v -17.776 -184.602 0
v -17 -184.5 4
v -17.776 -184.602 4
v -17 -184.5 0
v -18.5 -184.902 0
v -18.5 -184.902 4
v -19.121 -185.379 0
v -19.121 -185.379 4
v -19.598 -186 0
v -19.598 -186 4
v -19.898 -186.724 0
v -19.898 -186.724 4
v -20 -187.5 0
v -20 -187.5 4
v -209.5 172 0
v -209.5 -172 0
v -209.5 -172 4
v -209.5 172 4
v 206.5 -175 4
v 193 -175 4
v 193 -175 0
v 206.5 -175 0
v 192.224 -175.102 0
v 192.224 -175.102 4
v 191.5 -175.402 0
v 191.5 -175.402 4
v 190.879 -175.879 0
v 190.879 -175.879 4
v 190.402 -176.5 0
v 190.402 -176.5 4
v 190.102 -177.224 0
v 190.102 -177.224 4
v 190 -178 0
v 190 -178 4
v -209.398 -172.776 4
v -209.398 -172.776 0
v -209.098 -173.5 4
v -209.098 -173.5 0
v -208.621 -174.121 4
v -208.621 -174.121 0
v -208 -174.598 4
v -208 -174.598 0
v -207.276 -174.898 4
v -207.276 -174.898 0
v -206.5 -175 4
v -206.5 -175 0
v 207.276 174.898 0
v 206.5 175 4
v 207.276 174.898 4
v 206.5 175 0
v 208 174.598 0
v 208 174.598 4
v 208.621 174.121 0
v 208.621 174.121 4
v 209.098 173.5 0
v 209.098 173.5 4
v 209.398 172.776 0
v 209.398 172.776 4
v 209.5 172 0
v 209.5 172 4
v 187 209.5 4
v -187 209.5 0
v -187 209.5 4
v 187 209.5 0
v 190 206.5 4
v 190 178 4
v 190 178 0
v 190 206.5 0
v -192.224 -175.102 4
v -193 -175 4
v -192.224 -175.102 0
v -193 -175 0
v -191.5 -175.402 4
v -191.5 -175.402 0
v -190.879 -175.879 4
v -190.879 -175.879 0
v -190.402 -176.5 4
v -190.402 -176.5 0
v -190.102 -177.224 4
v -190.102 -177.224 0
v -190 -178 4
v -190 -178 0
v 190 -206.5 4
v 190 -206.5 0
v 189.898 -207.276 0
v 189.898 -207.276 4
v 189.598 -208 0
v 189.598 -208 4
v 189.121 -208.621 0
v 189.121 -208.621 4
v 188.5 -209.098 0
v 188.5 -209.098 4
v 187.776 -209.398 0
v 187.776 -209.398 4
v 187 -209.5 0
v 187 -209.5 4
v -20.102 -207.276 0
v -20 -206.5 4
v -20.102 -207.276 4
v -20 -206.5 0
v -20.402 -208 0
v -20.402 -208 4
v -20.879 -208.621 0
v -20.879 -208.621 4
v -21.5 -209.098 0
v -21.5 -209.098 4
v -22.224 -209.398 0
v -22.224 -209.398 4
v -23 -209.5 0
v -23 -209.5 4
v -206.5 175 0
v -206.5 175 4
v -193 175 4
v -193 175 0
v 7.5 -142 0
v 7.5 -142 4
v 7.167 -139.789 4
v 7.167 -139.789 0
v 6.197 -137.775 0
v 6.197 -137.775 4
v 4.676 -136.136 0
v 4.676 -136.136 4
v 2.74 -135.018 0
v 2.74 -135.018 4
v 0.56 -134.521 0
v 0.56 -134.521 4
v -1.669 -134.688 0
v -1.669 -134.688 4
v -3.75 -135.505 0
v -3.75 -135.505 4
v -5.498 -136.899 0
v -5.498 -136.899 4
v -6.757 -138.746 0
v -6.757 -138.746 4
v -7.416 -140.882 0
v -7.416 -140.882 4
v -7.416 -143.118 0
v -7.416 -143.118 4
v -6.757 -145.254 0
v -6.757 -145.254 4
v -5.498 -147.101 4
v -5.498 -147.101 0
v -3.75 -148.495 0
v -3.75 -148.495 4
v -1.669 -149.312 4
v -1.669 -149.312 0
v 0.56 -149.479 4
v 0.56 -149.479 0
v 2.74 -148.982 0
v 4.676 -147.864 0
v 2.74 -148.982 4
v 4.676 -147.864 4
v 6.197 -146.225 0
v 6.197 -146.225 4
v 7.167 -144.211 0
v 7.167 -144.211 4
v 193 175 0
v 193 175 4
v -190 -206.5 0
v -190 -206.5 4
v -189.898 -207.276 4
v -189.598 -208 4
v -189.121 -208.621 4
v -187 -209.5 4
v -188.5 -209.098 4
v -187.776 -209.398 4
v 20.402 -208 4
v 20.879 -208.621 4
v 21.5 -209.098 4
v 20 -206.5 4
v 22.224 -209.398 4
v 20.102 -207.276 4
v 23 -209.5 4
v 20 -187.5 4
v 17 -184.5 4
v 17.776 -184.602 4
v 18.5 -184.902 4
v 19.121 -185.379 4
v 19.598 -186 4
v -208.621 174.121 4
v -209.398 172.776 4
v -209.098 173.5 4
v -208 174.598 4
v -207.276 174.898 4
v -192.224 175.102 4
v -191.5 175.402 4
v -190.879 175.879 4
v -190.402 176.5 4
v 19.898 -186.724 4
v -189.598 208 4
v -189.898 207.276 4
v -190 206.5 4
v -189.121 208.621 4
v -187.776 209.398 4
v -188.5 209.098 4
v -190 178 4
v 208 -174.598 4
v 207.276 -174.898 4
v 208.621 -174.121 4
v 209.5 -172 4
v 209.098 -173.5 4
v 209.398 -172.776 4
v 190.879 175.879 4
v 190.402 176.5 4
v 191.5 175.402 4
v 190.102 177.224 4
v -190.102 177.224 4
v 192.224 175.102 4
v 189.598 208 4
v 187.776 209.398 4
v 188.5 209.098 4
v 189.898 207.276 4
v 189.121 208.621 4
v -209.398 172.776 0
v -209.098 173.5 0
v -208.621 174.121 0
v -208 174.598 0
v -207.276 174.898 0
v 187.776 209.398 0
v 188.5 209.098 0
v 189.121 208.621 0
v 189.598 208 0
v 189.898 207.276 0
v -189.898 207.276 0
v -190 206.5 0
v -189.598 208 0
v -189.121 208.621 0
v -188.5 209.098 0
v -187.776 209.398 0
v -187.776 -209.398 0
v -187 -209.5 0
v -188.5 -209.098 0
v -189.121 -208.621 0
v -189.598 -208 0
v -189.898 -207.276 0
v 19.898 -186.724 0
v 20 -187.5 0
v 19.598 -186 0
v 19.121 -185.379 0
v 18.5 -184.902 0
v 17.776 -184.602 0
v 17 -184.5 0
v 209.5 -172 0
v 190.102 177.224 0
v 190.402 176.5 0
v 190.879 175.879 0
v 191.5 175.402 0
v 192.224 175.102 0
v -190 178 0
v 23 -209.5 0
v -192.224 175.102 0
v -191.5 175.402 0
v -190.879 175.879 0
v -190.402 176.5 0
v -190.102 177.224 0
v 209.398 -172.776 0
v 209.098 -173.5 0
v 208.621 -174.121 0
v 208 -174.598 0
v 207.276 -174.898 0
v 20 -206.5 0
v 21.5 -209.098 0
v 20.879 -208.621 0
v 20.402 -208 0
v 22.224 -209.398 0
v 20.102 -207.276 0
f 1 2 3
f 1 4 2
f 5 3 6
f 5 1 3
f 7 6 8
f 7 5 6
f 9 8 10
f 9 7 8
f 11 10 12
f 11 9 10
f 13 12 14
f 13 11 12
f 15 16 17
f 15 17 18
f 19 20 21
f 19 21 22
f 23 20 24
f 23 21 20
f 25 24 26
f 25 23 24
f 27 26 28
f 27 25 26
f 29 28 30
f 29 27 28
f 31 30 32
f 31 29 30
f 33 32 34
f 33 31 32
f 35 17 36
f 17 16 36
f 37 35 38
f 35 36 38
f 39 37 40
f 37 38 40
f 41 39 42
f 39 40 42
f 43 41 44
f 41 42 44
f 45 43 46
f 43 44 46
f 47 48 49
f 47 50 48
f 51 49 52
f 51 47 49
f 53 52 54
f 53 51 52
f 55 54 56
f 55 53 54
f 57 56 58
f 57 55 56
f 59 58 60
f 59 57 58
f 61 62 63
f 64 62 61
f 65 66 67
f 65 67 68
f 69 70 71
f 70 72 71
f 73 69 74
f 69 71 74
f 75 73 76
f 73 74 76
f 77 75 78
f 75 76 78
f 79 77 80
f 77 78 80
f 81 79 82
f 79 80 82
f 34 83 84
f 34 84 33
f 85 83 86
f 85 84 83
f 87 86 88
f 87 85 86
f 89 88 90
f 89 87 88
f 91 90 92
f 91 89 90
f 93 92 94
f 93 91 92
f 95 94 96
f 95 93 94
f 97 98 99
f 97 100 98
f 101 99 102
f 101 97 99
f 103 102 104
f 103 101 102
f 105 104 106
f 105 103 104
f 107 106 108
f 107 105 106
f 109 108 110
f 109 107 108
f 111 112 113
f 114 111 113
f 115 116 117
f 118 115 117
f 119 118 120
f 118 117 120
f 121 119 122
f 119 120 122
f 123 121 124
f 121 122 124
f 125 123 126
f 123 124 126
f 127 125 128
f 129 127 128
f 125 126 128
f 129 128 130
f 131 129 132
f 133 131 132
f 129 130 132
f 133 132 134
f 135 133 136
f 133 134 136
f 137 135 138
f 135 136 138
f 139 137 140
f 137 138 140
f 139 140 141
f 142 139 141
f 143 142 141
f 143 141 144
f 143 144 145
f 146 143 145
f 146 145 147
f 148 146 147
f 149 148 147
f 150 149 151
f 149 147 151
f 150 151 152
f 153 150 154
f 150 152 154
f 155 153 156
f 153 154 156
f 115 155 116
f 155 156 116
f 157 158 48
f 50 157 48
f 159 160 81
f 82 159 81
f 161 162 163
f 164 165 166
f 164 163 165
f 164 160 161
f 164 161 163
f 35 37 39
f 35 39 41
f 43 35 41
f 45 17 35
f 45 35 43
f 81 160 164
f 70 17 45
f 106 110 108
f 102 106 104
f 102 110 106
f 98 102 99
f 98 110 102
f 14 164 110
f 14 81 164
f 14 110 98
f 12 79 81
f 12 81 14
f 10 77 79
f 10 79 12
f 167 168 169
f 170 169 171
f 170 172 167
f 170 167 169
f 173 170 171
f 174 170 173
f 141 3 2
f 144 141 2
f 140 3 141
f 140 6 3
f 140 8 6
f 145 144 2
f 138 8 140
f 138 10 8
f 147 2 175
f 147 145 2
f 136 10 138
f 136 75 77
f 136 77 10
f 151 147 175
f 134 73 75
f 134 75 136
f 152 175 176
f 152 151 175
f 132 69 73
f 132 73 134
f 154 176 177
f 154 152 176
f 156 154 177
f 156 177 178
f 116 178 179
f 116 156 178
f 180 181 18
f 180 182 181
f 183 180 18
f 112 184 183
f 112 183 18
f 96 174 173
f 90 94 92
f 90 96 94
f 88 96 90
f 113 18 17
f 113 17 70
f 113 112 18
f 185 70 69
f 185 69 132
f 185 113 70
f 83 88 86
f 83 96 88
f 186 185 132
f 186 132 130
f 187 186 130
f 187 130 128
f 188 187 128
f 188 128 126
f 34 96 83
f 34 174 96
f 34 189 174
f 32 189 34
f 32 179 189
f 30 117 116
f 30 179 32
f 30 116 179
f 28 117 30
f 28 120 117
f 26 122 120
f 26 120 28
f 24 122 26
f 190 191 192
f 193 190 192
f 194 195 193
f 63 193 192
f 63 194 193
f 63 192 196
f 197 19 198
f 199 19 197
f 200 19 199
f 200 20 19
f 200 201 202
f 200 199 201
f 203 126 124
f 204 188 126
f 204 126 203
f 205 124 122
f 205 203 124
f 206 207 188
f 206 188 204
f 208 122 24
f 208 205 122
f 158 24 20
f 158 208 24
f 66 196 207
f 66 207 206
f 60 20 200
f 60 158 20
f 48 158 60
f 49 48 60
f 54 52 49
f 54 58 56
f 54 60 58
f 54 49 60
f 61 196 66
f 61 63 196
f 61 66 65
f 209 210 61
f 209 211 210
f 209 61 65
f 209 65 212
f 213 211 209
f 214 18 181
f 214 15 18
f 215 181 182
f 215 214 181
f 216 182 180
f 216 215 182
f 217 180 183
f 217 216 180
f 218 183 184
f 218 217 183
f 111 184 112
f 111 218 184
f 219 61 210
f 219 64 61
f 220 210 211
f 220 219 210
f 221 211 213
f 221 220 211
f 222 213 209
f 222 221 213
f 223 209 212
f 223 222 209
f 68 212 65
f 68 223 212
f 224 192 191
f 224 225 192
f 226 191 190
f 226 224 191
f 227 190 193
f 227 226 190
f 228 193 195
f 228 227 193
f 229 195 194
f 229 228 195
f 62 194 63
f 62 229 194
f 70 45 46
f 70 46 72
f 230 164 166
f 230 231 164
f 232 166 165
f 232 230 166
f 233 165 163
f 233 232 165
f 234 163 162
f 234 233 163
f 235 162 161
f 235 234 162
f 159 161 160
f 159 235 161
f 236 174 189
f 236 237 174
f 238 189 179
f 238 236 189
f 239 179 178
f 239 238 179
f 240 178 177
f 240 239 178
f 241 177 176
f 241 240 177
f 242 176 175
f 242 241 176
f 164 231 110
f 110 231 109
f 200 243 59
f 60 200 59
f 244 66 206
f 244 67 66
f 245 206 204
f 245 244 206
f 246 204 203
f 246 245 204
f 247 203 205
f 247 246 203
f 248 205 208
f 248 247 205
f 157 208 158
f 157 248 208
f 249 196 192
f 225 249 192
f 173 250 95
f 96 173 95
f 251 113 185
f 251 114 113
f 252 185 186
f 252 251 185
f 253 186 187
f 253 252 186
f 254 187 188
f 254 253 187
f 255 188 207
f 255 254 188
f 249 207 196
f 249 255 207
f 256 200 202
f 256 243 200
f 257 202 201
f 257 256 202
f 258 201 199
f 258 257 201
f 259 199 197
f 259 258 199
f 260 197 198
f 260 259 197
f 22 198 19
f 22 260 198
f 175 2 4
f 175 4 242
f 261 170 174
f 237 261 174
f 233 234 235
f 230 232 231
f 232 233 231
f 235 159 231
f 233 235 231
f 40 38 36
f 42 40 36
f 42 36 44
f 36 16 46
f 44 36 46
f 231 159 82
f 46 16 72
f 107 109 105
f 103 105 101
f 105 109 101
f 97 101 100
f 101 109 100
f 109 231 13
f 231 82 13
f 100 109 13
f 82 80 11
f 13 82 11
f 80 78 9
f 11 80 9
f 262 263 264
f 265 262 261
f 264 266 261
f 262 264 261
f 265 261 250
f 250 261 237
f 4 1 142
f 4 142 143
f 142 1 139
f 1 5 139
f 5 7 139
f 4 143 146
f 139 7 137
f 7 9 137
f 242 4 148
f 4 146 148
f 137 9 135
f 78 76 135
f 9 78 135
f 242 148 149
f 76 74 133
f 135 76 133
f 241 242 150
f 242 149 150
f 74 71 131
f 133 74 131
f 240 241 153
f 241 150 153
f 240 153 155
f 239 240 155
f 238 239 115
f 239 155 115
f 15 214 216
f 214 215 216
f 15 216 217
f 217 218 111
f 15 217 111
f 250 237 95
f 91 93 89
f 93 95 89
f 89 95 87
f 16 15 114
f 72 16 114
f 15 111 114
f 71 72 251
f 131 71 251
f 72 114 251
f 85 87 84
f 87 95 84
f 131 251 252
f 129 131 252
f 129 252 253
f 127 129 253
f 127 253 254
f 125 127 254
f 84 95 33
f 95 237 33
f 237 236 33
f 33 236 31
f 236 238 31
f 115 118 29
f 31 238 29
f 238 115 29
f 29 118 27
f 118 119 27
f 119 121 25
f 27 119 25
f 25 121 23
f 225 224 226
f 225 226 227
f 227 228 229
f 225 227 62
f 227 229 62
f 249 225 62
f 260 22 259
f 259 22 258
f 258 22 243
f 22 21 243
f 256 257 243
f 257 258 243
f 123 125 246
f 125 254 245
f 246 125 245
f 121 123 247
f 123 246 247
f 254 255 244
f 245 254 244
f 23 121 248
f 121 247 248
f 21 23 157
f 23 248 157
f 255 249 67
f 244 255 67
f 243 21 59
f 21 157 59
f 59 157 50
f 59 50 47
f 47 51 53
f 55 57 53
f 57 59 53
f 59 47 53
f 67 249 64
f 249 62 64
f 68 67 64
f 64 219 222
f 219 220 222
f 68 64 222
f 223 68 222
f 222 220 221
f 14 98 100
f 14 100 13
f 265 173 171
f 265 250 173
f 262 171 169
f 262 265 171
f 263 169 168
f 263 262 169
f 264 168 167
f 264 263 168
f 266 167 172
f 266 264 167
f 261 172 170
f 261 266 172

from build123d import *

# Parameters (mm, degrees)
SKETCH1_W           = 419
SKETCH1_H           = 419
BASE_SHEET_DEPTH    = 4
SKETCH2_W           = 19.5
SKETCH2_H           = 34.5
BELT_CUTOUTS_DEPTH  = 297.304741778
SKETCH3_R           = 7.5
SKETCH3_W           = 40
SKETCH3_H           = 25
CABLE_CUTOUTS_DEPTH = 4
FILLET1_R           = 3


with BuildPart() as part:
    # Sketch1 → base sheet (new body)
    with BuildSketch(Plane.XY):
        Rectangle(SKETCH1_W, SKETCH1_H)
    extrude(amount=BASE_SHEET_DEPTH)

    # Sketch2 → belt cutouts (cut, through all)
    with BuildSketch(Plane.XY.offset(4)):
        with Locations((-199.75, 192.25)):
            Rectangle(SKETCH2_W, SKETCH2_H)
        with Locations((199.75, 192.25)):
            Rectangle(SKETCH2_W, SKETCH2_H)
        with Locations((-199.75, -192.25)):
            Rectangle(SKETCH2_W, SKETCH2_H)
        with Locations((199.75, -192.25)):
            Rectangle(SKETCH2_W, SKETCH2_H)
    extrude(amount=-BELT_CUTOUTS_DEPTH, mode=Mode.SUBTRACT)

    # Sketch3 → cable cutouts (cut)
    with BuildSketch(Plane.XY.offset(4)):
        with Locations((0, -142)):
            Circle(SKETCH3_R)
        with Locations((0, -197)):
            Rectangle(SKETCH3_W, SKETCH3_H)
    extrude(amount=-CABLE_CUTOUTS_DEPTH, mode=Mode.SUBTRACT)

    # Fillet1
    fillet1_edges = [part.edges().sort_by_distance(p)[0] for p in [
        (209.5, 175, 2),
        (190, 175, 2),
        (190, 209.5, 2),
        (-209.5, -175, 2),
        (-190, -175, 2),
        (-190, -209.5, 2),
        (209.5, -175, 2),
        (190, -209.5, 2),
        (190, -175, 2),
        (-209.5, 175, 2),
        (-190, 209.5, 2),
        (-190, 175, 2),
        (-20, -209.5, 2),
        (-20, -184.5, 2),
        (20, -184.5, 2),
        (20, -209.5, 2),
    ]]
    fillet(fillet1_edges, radius=FILLET1_R)


solid = part.part
